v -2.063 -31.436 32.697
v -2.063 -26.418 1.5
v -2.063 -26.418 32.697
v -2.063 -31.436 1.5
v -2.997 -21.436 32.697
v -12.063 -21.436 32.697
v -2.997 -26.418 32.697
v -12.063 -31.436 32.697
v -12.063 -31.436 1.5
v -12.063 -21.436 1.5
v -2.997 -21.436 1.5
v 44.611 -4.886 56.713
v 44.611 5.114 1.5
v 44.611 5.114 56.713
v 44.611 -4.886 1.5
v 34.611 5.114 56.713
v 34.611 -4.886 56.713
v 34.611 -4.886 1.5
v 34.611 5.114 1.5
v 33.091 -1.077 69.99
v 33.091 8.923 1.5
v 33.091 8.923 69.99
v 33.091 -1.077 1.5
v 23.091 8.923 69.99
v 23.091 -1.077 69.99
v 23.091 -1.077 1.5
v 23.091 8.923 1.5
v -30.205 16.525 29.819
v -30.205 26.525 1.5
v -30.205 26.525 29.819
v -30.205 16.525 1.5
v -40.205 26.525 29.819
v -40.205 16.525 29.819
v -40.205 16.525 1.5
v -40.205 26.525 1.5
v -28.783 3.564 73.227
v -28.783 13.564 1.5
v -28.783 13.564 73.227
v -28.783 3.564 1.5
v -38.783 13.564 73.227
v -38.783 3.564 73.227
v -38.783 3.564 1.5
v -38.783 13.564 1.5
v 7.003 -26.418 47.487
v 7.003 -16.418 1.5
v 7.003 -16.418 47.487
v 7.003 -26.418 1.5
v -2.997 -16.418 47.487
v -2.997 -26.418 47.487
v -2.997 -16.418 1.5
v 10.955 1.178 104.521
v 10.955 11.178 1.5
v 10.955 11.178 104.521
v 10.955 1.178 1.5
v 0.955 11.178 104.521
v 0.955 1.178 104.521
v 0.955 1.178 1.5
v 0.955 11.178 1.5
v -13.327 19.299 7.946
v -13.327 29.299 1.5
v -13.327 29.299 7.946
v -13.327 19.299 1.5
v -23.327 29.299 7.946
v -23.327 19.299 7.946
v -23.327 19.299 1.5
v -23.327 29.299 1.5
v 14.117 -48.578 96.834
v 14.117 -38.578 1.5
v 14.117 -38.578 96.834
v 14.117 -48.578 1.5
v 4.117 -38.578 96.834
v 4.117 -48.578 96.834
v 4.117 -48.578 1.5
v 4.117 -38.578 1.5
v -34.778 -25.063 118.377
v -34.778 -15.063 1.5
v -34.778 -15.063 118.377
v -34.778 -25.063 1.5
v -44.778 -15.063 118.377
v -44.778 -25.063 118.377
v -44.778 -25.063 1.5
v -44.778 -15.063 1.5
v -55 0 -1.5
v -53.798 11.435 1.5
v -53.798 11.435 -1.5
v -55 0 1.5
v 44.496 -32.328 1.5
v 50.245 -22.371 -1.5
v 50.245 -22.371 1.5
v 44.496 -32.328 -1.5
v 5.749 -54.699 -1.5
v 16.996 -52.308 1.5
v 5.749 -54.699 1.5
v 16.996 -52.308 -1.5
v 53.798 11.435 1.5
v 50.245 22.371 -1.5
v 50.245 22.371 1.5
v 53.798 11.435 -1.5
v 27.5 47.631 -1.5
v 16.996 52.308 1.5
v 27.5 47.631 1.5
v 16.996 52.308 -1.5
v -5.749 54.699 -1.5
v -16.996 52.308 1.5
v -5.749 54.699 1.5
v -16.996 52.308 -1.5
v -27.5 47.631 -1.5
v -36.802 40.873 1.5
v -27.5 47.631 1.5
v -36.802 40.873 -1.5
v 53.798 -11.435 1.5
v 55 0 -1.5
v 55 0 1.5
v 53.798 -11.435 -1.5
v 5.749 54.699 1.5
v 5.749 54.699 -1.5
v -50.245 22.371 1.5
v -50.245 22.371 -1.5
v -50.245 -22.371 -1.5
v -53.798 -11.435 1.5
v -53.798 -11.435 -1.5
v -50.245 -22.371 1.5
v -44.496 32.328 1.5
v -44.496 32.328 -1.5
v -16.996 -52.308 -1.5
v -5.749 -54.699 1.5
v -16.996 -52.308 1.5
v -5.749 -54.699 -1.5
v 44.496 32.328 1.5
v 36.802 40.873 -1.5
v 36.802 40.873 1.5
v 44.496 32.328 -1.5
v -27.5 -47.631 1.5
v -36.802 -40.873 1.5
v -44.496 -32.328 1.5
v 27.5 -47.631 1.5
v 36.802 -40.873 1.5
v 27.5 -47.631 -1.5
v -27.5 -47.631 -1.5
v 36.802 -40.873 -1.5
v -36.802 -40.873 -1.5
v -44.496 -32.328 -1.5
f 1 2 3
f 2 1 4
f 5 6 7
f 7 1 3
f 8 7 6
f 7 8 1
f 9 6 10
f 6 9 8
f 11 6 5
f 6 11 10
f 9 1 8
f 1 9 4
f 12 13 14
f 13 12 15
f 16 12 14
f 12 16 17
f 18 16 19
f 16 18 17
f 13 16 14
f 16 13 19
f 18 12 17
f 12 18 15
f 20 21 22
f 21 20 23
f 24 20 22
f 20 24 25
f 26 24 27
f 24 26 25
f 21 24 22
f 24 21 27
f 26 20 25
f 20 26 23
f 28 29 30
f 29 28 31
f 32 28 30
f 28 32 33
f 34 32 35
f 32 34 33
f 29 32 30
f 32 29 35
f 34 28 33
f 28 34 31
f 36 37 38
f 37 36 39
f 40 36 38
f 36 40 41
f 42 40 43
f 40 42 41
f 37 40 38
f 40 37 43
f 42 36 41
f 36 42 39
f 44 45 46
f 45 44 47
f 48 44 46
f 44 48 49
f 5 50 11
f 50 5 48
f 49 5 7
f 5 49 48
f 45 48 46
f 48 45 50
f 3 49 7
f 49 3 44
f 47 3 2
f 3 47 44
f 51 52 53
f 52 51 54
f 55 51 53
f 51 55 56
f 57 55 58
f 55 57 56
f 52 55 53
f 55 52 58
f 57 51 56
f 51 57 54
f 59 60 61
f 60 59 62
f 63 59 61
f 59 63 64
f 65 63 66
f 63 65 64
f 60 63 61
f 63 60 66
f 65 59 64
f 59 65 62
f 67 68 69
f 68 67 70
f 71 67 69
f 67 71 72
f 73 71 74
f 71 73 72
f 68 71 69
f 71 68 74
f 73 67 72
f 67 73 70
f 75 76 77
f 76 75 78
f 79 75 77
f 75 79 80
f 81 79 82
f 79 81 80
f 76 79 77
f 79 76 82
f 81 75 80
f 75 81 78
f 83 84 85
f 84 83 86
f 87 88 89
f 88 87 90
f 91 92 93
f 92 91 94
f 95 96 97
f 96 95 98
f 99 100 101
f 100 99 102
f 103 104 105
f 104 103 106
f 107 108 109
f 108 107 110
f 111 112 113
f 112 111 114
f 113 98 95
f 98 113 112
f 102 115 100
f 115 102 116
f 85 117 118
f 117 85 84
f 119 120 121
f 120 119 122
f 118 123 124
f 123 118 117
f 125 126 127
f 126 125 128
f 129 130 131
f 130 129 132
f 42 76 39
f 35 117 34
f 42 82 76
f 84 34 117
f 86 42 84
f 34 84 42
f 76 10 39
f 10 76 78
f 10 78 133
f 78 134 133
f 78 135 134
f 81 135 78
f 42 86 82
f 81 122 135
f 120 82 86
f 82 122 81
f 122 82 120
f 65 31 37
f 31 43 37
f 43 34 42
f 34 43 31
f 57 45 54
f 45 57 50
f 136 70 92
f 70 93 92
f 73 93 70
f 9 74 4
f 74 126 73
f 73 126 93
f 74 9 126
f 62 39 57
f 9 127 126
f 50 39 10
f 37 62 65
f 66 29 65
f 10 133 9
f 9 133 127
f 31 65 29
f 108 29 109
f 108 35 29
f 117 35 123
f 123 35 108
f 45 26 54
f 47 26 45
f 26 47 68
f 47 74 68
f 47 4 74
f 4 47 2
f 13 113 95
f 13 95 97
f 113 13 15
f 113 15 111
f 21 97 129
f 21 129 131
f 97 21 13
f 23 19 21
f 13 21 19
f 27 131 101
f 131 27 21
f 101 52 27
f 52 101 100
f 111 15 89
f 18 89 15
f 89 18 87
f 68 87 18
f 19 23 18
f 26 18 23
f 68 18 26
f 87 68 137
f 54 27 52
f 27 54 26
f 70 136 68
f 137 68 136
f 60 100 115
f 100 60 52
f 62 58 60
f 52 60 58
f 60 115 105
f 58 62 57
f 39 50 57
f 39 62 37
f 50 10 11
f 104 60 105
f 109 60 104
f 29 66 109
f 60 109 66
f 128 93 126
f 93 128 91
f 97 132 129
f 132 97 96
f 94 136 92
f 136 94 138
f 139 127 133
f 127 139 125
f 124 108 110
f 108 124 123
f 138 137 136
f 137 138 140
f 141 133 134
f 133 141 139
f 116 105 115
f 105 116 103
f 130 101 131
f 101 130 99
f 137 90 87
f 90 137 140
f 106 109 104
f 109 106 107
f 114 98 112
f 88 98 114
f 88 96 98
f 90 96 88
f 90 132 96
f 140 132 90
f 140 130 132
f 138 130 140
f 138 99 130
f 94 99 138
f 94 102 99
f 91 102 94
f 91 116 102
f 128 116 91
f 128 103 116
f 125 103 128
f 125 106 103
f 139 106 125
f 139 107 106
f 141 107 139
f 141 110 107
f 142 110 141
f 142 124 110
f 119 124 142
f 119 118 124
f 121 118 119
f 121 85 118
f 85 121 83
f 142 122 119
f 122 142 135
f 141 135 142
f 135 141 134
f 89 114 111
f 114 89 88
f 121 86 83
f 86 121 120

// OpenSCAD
radius = 55;
number_of_tower = 10;
tower_size = 10;
max_tower_height = 150;
disk_height = 3;

cylinder(disk_height,   radius, radius,true);
for(i=[0:number_of_tower]) {
    
    height = rands(0,max_tower_height,1)[0];
    tx = rands(tower_size-radius,radius-tower_size,1)[0];
    maxy = sqrt(pow(radius-tower_size, 2) - pow(tx, 2));
    ty = rands(-maxy,maxy,1)[0];
    
    translate([tx,ty,height/2]) cube([tower_size,tower_size,height], true);
}
